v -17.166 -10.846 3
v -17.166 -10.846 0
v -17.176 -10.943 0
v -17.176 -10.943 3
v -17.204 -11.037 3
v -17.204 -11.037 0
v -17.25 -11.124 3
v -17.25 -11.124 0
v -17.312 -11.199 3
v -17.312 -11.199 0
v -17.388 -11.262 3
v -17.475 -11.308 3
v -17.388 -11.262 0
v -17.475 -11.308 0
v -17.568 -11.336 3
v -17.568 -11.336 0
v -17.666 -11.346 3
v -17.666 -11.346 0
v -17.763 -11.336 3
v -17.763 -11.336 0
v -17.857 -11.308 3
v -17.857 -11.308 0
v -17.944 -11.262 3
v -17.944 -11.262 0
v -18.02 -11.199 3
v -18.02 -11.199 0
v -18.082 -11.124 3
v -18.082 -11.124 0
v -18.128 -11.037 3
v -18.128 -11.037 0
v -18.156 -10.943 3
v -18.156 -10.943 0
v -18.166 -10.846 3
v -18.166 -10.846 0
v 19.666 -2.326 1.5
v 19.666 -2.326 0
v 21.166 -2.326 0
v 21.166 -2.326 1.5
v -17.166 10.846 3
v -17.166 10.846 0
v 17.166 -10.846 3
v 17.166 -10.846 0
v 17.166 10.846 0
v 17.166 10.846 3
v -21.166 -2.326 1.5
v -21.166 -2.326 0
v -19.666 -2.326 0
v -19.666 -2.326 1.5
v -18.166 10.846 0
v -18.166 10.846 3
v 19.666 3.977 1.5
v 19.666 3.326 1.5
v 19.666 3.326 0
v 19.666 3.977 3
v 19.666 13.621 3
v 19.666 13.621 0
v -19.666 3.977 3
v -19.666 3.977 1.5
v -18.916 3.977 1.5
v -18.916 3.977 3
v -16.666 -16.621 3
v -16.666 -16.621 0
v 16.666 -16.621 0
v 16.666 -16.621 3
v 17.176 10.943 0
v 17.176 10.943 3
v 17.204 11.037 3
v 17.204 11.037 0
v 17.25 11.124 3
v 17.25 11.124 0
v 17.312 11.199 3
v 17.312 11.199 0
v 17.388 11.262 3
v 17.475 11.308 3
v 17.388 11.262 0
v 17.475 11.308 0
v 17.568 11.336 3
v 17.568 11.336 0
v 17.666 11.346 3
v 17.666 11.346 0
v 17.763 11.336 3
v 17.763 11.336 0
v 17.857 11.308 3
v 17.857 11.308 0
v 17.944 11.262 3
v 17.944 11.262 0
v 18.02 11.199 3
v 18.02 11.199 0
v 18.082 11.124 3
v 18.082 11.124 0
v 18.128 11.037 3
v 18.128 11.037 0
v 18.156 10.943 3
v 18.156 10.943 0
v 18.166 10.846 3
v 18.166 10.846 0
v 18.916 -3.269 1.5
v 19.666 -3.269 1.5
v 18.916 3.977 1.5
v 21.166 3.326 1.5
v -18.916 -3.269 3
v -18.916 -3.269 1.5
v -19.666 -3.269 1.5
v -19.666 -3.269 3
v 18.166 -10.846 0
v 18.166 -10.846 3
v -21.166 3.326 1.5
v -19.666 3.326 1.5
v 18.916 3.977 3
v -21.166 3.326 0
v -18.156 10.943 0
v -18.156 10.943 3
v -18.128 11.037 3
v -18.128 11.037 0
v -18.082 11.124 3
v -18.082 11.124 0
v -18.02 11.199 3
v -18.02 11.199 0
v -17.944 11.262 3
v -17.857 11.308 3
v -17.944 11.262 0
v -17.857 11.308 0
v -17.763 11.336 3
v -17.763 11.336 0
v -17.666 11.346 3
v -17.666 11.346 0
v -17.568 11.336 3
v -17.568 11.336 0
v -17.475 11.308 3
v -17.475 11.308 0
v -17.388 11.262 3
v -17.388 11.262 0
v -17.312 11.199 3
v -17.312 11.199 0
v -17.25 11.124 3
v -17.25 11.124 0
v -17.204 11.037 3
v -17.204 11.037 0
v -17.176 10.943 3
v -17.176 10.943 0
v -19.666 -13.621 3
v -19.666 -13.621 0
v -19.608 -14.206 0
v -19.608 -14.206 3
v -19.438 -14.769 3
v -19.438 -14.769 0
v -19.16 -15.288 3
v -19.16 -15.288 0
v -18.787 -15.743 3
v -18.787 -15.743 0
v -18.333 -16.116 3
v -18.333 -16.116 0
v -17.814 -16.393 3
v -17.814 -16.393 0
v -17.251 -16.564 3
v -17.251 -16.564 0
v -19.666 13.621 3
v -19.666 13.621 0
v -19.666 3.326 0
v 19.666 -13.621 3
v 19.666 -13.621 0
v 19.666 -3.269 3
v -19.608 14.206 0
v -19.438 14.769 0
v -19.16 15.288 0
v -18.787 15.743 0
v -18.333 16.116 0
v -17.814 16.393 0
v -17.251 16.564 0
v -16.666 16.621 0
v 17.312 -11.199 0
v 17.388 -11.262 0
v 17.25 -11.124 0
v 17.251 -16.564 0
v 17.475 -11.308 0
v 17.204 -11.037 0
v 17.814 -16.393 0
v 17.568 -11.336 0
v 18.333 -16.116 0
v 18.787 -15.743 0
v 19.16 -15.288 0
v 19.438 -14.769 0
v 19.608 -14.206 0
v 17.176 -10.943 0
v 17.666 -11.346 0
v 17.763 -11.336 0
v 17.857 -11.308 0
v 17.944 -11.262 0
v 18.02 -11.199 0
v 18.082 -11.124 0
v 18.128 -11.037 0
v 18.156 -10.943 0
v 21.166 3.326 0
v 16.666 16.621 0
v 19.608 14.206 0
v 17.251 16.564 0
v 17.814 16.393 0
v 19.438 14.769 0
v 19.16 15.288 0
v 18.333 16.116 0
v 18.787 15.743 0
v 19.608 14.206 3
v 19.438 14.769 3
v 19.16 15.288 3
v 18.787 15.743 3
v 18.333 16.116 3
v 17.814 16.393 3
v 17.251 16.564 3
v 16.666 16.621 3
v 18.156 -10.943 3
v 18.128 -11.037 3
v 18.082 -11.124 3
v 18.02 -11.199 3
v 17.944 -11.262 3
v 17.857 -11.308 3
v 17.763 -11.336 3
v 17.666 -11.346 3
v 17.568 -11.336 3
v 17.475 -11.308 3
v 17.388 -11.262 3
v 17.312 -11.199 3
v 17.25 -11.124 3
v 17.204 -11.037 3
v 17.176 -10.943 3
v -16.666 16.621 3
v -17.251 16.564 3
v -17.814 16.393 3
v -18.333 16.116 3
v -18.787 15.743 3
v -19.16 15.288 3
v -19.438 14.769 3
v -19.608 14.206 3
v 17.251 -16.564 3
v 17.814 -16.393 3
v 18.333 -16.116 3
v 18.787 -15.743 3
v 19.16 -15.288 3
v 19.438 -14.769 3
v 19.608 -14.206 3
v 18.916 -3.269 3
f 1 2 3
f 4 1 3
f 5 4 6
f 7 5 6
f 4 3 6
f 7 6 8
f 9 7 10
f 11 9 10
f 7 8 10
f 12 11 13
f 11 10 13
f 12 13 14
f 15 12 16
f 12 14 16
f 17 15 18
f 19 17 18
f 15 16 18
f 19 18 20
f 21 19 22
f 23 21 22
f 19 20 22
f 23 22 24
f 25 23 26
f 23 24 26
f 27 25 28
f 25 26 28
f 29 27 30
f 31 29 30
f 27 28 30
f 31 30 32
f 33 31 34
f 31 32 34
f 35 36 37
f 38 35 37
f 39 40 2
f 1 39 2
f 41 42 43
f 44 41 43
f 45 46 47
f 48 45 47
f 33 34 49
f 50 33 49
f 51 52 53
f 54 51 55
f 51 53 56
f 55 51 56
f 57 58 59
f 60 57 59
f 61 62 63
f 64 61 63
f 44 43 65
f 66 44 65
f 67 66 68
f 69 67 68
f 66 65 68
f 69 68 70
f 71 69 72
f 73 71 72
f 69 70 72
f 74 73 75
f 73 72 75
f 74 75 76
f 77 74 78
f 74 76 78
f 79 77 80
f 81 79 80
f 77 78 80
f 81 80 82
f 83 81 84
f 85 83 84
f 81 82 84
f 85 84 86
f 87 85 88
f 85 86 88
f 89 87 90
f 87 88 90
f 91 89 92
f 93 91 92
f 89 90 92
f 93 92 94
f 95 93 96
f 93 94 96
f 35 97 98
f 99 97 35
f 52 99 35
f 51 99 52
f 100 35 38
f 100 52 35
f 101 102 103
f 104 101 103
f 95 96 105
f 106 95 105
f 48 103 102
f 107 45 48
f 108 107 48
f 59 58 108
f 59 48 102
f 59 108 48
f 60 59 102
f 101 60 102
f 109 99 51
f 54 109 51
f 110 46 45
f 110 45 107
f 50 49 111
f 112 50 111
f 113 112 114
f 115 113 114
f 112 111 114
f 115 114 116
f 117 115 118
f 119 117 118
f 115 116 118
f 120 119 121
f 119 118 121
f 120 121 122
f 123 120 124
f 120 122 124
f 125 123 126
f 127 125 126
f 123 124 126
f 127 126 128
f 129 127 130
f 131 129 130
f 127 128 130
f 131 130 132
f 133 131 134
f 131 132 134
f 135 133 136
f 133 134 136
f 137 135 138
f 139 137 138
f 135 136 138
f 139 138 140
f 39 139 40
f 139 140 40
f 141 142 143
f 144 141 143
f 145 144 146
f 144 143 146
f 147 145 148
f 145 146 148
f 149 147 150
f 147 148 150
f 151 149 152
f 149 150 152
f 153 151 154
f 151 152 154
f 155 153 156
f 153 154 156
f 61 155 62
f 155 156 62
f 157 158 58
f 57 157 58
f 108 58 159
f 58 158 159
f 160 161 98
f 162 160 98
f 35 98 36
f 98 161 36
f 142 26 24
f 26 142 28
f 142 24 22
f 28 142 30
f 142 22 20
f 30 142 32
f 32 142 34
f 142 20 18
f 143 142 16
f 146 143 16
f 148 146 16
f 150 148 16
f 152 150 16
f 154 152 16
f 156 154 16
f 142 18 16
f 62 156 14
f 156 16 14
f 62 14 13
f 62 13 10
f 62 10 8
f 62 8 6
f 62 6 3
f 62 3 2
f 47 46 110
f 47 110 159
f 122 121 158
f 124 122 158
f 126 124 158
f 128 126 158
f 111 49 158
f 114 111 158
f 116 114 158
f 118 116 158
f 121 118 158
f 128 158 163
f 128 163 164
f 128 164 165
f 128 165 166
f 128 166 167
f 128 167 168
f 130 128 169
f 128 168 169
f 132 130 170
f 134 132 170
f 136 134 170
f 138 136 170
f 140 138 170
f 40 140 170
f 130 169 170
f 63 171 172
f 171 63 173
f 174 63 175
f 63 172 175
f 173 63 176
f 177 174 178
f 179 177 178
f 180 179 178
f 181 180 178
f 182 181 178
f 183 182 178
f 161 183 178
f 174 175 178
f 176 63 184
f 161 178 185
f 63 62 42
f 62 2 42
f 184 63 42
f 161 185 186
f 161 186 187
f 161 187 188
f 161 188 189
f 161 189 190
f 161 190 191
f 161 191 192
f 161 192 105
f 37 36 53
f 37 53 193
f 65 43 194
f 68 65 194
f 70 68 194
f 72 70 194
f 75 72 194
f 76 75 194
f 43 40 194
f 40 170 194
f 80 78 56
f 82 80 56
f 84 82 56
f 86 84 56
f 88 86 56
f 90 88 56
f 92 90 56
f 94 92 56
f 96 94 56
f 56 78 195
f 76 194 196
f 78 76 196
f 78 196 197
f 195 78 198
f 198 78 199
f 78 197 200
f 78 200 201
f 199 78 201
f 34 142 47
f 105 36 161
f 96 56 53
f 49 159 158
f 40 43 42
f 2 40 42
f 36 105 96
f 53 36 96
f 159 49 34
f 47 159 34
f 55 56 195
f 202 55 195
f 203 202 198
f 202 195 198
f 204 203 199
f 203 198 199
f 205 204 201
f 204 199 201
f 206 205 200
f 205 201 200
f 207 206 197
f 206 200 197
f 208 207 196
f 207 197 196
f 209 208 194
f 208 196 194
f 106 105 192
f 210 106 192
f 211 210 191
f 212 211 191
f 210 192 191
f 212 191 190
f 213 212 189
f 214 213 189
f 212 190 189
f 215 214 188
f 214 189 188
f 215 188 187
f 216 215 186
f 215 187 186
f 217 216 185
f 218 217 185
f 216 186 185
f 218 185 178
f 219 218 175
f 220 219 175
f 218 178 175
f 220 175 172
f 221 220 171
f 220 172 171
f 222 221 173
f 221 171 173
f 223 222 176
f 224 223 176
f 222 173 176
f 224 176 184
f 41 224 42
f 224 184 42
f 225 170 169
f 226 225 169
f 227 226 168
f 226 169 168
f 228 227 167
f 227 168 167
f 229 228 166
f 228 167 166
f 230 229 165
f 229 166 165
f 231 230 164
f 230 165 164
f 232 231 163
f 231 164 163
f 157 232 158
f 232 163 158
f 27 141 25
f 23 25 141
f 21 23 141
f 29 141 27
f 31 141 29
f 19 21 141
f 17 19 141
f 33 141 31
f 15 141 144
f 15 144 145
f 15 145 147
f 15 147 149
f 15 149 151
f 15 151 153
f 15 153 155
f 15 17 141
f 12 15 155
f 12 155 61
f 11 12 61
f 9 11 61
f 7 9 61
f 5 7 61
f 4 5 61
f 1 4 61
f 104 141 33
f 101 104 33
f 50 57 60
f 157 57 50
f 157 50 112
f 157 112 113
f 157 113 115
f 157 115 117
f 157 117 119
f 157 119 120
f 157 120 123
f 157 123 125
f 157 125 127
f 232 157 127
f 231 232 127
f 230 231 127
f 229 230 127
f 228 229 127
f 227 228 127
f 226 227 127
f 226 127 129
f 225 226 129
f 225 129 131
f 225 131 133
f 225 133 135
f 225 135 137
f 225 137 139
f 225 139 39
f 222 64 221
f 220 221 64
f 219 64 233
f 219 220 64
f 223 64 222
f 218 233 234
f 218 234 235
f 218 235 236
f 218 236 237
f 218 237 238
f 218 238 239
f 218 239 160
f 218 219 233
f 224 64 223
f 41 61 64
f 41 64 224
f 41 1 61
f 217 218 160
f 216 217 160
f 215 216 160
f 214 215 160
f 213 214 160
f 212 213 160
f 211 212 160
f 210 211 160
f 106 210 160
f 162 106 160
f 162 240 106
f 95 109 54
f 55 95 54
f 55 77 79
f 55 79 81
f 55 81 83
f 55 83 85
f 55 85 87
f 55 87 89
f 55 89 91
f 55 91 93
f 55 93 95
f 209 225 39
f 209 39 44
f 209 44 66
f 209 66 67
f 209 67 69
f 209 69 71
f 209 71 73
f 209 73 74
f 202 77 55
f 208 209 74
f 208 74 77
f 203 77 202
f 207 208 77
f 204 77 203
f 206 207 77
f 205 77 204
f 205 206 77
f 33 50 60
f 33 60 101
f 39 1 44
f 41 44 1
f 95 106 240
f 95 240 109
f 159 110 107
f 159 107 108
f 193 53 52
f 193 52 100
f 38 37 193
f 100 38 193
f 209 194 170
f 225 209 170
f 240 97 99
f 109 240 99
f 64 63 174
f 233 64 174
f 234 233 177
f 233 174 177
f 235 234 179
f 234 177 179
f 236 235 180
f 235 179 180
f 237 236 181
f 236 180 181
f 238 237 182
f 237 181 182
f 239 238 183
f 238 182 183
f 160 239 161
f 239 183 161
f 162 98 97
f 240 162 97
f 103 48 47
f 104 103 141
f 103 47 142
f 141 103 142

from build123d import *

# Parameters (mm, degrees)
F2_DEPTH = 3
F1_W     = 1.5
F1_H     = 5.6522476953
F3_DEPTH = 1.5


with BuildPart() as f2:
    # F1 (on Top) → F2 (new body)
    with BuildSketch(Plane.XY):
        with BuildLine():
            Line((16.665947184, 16.6212058179), (-16.665947184, 16.6212058179))
            ThreePointArc((-16.665947184, 16.6212058179), (-18.7872675275, 15.7425261615), (-19.665947184, 13.6212058179))
            Line((-19.665947184, 13.6212058179), (-19.665947184, 3.9769788273))
            Line((-19.665947184, 3.9769788273), (-18.915947184, 3.9769788273))
            Line((-18.915947184, 3.9769788273), (-18.915947184, -3.2694519032))
            Line((-18.915947184, -3.2694519032), (-19.665947184, -3.2694519032))
            Line((-19.665947184, -3.2694519032), (-19.665947184, -13.6212058179))
            ThreePointArc((-19.665947184, -13.6212058179), (-18.7872675275, -15.7425261615), (-16.665947184, -16.6212058179))
            Line((-16.665947184, -16.6212058179), (16.665947184, -16.6212058179))
            ThreePointArc((16.665947184, -16.6212058179), (18.7872675275, -15.7425261615), (19.665947184, -13.6212058179))
            Line((19.665947184, -13.6212058179), (19.665947184, -3.2694519032))
            Line((19.665947184, -3.2694519032), (18.915947184, -3.2694519032))
            Line((18.915947184, -3.2694519032), (18.915947184, 3.9769788273))
            Line((18.915947184, 3.9769788273), (19.665947184, 3.9769788273))
            Line((19.665947184, 3.9769788273), (19.665947184, 13.6212058179))
            ThreePointArc((19.665947184, 13.6212058179), (18.7872675275, 15.7425261615), (16.665947184, 16.6212058179))
        make_face()
        with BuildLine():
            Line((-18.165947184, -10.8459210023), (-18.165947184, 10.8459210023))
            ThreePointArc((-18.165947184, 10.8459210023), (-17.665947184, 11.3459210023), (-17.165947184, 10.8459210023))
            Line((-17.165947184, 10.8459210023), (-17.165947184, -10.8459210023))
            ThreePointArc((-17.165947184, -10.8459210023), (-17.665947184, -11.3459210023), (-18.165947184, -10.8459210023))
        make_face(mode=Mode.SUBTRACT)
        with BuildLine():
            ThreePointArc((17.165947184, 10.8459210023), (17.665947184, 11.3459210023), (18.165947184, 10.8459210023))
            Line((18.165947184, 10.8459210023), (18.165947184, -10.8459210023))
            ThreePointArc((18.165947184, -10.8459210023), (17.665947184, -11.3459210023), (17.165947184, -10.8459210023))
            Line((17.165947184, -10.8459210023), (17.165947184, 10.8459210023))
        make_face(mode=Mode.SUBTRACT)
    extrude(amount=F2_DEPTH)

    # F1 (on Top) → F3 (join)
    with BuildSketch(Plane.XY):
        with Locations((-20.415947184, 0.5000088131)):
            Rectangle(F1_W, F1_H)
        Polygon((-18.915947184, 3.9769788273), (-19.665947184, 3.9769788273), (-19.665947184, 3.3261326607), (-19.665947184, -2.3261150345), (-19.665947184, -3.2694519032), (-18.915947184, -3.2694519032), align=None)
        Polygon((19.665947184, 3.3261326607), (19.665947184, 3.9769788273), (18.915947184, 3.9769788273), (18.915947184, -3.2694519032), (19.665947184, -3.2694519032), (19.665947184, -2.3261150345), align=None)
        with Locations((20.415947184, 0.5000088131)):
            Rectangle(F1_W, F1_H)
    extrude(amount=F3_DEPTH)


solid = f2.part
